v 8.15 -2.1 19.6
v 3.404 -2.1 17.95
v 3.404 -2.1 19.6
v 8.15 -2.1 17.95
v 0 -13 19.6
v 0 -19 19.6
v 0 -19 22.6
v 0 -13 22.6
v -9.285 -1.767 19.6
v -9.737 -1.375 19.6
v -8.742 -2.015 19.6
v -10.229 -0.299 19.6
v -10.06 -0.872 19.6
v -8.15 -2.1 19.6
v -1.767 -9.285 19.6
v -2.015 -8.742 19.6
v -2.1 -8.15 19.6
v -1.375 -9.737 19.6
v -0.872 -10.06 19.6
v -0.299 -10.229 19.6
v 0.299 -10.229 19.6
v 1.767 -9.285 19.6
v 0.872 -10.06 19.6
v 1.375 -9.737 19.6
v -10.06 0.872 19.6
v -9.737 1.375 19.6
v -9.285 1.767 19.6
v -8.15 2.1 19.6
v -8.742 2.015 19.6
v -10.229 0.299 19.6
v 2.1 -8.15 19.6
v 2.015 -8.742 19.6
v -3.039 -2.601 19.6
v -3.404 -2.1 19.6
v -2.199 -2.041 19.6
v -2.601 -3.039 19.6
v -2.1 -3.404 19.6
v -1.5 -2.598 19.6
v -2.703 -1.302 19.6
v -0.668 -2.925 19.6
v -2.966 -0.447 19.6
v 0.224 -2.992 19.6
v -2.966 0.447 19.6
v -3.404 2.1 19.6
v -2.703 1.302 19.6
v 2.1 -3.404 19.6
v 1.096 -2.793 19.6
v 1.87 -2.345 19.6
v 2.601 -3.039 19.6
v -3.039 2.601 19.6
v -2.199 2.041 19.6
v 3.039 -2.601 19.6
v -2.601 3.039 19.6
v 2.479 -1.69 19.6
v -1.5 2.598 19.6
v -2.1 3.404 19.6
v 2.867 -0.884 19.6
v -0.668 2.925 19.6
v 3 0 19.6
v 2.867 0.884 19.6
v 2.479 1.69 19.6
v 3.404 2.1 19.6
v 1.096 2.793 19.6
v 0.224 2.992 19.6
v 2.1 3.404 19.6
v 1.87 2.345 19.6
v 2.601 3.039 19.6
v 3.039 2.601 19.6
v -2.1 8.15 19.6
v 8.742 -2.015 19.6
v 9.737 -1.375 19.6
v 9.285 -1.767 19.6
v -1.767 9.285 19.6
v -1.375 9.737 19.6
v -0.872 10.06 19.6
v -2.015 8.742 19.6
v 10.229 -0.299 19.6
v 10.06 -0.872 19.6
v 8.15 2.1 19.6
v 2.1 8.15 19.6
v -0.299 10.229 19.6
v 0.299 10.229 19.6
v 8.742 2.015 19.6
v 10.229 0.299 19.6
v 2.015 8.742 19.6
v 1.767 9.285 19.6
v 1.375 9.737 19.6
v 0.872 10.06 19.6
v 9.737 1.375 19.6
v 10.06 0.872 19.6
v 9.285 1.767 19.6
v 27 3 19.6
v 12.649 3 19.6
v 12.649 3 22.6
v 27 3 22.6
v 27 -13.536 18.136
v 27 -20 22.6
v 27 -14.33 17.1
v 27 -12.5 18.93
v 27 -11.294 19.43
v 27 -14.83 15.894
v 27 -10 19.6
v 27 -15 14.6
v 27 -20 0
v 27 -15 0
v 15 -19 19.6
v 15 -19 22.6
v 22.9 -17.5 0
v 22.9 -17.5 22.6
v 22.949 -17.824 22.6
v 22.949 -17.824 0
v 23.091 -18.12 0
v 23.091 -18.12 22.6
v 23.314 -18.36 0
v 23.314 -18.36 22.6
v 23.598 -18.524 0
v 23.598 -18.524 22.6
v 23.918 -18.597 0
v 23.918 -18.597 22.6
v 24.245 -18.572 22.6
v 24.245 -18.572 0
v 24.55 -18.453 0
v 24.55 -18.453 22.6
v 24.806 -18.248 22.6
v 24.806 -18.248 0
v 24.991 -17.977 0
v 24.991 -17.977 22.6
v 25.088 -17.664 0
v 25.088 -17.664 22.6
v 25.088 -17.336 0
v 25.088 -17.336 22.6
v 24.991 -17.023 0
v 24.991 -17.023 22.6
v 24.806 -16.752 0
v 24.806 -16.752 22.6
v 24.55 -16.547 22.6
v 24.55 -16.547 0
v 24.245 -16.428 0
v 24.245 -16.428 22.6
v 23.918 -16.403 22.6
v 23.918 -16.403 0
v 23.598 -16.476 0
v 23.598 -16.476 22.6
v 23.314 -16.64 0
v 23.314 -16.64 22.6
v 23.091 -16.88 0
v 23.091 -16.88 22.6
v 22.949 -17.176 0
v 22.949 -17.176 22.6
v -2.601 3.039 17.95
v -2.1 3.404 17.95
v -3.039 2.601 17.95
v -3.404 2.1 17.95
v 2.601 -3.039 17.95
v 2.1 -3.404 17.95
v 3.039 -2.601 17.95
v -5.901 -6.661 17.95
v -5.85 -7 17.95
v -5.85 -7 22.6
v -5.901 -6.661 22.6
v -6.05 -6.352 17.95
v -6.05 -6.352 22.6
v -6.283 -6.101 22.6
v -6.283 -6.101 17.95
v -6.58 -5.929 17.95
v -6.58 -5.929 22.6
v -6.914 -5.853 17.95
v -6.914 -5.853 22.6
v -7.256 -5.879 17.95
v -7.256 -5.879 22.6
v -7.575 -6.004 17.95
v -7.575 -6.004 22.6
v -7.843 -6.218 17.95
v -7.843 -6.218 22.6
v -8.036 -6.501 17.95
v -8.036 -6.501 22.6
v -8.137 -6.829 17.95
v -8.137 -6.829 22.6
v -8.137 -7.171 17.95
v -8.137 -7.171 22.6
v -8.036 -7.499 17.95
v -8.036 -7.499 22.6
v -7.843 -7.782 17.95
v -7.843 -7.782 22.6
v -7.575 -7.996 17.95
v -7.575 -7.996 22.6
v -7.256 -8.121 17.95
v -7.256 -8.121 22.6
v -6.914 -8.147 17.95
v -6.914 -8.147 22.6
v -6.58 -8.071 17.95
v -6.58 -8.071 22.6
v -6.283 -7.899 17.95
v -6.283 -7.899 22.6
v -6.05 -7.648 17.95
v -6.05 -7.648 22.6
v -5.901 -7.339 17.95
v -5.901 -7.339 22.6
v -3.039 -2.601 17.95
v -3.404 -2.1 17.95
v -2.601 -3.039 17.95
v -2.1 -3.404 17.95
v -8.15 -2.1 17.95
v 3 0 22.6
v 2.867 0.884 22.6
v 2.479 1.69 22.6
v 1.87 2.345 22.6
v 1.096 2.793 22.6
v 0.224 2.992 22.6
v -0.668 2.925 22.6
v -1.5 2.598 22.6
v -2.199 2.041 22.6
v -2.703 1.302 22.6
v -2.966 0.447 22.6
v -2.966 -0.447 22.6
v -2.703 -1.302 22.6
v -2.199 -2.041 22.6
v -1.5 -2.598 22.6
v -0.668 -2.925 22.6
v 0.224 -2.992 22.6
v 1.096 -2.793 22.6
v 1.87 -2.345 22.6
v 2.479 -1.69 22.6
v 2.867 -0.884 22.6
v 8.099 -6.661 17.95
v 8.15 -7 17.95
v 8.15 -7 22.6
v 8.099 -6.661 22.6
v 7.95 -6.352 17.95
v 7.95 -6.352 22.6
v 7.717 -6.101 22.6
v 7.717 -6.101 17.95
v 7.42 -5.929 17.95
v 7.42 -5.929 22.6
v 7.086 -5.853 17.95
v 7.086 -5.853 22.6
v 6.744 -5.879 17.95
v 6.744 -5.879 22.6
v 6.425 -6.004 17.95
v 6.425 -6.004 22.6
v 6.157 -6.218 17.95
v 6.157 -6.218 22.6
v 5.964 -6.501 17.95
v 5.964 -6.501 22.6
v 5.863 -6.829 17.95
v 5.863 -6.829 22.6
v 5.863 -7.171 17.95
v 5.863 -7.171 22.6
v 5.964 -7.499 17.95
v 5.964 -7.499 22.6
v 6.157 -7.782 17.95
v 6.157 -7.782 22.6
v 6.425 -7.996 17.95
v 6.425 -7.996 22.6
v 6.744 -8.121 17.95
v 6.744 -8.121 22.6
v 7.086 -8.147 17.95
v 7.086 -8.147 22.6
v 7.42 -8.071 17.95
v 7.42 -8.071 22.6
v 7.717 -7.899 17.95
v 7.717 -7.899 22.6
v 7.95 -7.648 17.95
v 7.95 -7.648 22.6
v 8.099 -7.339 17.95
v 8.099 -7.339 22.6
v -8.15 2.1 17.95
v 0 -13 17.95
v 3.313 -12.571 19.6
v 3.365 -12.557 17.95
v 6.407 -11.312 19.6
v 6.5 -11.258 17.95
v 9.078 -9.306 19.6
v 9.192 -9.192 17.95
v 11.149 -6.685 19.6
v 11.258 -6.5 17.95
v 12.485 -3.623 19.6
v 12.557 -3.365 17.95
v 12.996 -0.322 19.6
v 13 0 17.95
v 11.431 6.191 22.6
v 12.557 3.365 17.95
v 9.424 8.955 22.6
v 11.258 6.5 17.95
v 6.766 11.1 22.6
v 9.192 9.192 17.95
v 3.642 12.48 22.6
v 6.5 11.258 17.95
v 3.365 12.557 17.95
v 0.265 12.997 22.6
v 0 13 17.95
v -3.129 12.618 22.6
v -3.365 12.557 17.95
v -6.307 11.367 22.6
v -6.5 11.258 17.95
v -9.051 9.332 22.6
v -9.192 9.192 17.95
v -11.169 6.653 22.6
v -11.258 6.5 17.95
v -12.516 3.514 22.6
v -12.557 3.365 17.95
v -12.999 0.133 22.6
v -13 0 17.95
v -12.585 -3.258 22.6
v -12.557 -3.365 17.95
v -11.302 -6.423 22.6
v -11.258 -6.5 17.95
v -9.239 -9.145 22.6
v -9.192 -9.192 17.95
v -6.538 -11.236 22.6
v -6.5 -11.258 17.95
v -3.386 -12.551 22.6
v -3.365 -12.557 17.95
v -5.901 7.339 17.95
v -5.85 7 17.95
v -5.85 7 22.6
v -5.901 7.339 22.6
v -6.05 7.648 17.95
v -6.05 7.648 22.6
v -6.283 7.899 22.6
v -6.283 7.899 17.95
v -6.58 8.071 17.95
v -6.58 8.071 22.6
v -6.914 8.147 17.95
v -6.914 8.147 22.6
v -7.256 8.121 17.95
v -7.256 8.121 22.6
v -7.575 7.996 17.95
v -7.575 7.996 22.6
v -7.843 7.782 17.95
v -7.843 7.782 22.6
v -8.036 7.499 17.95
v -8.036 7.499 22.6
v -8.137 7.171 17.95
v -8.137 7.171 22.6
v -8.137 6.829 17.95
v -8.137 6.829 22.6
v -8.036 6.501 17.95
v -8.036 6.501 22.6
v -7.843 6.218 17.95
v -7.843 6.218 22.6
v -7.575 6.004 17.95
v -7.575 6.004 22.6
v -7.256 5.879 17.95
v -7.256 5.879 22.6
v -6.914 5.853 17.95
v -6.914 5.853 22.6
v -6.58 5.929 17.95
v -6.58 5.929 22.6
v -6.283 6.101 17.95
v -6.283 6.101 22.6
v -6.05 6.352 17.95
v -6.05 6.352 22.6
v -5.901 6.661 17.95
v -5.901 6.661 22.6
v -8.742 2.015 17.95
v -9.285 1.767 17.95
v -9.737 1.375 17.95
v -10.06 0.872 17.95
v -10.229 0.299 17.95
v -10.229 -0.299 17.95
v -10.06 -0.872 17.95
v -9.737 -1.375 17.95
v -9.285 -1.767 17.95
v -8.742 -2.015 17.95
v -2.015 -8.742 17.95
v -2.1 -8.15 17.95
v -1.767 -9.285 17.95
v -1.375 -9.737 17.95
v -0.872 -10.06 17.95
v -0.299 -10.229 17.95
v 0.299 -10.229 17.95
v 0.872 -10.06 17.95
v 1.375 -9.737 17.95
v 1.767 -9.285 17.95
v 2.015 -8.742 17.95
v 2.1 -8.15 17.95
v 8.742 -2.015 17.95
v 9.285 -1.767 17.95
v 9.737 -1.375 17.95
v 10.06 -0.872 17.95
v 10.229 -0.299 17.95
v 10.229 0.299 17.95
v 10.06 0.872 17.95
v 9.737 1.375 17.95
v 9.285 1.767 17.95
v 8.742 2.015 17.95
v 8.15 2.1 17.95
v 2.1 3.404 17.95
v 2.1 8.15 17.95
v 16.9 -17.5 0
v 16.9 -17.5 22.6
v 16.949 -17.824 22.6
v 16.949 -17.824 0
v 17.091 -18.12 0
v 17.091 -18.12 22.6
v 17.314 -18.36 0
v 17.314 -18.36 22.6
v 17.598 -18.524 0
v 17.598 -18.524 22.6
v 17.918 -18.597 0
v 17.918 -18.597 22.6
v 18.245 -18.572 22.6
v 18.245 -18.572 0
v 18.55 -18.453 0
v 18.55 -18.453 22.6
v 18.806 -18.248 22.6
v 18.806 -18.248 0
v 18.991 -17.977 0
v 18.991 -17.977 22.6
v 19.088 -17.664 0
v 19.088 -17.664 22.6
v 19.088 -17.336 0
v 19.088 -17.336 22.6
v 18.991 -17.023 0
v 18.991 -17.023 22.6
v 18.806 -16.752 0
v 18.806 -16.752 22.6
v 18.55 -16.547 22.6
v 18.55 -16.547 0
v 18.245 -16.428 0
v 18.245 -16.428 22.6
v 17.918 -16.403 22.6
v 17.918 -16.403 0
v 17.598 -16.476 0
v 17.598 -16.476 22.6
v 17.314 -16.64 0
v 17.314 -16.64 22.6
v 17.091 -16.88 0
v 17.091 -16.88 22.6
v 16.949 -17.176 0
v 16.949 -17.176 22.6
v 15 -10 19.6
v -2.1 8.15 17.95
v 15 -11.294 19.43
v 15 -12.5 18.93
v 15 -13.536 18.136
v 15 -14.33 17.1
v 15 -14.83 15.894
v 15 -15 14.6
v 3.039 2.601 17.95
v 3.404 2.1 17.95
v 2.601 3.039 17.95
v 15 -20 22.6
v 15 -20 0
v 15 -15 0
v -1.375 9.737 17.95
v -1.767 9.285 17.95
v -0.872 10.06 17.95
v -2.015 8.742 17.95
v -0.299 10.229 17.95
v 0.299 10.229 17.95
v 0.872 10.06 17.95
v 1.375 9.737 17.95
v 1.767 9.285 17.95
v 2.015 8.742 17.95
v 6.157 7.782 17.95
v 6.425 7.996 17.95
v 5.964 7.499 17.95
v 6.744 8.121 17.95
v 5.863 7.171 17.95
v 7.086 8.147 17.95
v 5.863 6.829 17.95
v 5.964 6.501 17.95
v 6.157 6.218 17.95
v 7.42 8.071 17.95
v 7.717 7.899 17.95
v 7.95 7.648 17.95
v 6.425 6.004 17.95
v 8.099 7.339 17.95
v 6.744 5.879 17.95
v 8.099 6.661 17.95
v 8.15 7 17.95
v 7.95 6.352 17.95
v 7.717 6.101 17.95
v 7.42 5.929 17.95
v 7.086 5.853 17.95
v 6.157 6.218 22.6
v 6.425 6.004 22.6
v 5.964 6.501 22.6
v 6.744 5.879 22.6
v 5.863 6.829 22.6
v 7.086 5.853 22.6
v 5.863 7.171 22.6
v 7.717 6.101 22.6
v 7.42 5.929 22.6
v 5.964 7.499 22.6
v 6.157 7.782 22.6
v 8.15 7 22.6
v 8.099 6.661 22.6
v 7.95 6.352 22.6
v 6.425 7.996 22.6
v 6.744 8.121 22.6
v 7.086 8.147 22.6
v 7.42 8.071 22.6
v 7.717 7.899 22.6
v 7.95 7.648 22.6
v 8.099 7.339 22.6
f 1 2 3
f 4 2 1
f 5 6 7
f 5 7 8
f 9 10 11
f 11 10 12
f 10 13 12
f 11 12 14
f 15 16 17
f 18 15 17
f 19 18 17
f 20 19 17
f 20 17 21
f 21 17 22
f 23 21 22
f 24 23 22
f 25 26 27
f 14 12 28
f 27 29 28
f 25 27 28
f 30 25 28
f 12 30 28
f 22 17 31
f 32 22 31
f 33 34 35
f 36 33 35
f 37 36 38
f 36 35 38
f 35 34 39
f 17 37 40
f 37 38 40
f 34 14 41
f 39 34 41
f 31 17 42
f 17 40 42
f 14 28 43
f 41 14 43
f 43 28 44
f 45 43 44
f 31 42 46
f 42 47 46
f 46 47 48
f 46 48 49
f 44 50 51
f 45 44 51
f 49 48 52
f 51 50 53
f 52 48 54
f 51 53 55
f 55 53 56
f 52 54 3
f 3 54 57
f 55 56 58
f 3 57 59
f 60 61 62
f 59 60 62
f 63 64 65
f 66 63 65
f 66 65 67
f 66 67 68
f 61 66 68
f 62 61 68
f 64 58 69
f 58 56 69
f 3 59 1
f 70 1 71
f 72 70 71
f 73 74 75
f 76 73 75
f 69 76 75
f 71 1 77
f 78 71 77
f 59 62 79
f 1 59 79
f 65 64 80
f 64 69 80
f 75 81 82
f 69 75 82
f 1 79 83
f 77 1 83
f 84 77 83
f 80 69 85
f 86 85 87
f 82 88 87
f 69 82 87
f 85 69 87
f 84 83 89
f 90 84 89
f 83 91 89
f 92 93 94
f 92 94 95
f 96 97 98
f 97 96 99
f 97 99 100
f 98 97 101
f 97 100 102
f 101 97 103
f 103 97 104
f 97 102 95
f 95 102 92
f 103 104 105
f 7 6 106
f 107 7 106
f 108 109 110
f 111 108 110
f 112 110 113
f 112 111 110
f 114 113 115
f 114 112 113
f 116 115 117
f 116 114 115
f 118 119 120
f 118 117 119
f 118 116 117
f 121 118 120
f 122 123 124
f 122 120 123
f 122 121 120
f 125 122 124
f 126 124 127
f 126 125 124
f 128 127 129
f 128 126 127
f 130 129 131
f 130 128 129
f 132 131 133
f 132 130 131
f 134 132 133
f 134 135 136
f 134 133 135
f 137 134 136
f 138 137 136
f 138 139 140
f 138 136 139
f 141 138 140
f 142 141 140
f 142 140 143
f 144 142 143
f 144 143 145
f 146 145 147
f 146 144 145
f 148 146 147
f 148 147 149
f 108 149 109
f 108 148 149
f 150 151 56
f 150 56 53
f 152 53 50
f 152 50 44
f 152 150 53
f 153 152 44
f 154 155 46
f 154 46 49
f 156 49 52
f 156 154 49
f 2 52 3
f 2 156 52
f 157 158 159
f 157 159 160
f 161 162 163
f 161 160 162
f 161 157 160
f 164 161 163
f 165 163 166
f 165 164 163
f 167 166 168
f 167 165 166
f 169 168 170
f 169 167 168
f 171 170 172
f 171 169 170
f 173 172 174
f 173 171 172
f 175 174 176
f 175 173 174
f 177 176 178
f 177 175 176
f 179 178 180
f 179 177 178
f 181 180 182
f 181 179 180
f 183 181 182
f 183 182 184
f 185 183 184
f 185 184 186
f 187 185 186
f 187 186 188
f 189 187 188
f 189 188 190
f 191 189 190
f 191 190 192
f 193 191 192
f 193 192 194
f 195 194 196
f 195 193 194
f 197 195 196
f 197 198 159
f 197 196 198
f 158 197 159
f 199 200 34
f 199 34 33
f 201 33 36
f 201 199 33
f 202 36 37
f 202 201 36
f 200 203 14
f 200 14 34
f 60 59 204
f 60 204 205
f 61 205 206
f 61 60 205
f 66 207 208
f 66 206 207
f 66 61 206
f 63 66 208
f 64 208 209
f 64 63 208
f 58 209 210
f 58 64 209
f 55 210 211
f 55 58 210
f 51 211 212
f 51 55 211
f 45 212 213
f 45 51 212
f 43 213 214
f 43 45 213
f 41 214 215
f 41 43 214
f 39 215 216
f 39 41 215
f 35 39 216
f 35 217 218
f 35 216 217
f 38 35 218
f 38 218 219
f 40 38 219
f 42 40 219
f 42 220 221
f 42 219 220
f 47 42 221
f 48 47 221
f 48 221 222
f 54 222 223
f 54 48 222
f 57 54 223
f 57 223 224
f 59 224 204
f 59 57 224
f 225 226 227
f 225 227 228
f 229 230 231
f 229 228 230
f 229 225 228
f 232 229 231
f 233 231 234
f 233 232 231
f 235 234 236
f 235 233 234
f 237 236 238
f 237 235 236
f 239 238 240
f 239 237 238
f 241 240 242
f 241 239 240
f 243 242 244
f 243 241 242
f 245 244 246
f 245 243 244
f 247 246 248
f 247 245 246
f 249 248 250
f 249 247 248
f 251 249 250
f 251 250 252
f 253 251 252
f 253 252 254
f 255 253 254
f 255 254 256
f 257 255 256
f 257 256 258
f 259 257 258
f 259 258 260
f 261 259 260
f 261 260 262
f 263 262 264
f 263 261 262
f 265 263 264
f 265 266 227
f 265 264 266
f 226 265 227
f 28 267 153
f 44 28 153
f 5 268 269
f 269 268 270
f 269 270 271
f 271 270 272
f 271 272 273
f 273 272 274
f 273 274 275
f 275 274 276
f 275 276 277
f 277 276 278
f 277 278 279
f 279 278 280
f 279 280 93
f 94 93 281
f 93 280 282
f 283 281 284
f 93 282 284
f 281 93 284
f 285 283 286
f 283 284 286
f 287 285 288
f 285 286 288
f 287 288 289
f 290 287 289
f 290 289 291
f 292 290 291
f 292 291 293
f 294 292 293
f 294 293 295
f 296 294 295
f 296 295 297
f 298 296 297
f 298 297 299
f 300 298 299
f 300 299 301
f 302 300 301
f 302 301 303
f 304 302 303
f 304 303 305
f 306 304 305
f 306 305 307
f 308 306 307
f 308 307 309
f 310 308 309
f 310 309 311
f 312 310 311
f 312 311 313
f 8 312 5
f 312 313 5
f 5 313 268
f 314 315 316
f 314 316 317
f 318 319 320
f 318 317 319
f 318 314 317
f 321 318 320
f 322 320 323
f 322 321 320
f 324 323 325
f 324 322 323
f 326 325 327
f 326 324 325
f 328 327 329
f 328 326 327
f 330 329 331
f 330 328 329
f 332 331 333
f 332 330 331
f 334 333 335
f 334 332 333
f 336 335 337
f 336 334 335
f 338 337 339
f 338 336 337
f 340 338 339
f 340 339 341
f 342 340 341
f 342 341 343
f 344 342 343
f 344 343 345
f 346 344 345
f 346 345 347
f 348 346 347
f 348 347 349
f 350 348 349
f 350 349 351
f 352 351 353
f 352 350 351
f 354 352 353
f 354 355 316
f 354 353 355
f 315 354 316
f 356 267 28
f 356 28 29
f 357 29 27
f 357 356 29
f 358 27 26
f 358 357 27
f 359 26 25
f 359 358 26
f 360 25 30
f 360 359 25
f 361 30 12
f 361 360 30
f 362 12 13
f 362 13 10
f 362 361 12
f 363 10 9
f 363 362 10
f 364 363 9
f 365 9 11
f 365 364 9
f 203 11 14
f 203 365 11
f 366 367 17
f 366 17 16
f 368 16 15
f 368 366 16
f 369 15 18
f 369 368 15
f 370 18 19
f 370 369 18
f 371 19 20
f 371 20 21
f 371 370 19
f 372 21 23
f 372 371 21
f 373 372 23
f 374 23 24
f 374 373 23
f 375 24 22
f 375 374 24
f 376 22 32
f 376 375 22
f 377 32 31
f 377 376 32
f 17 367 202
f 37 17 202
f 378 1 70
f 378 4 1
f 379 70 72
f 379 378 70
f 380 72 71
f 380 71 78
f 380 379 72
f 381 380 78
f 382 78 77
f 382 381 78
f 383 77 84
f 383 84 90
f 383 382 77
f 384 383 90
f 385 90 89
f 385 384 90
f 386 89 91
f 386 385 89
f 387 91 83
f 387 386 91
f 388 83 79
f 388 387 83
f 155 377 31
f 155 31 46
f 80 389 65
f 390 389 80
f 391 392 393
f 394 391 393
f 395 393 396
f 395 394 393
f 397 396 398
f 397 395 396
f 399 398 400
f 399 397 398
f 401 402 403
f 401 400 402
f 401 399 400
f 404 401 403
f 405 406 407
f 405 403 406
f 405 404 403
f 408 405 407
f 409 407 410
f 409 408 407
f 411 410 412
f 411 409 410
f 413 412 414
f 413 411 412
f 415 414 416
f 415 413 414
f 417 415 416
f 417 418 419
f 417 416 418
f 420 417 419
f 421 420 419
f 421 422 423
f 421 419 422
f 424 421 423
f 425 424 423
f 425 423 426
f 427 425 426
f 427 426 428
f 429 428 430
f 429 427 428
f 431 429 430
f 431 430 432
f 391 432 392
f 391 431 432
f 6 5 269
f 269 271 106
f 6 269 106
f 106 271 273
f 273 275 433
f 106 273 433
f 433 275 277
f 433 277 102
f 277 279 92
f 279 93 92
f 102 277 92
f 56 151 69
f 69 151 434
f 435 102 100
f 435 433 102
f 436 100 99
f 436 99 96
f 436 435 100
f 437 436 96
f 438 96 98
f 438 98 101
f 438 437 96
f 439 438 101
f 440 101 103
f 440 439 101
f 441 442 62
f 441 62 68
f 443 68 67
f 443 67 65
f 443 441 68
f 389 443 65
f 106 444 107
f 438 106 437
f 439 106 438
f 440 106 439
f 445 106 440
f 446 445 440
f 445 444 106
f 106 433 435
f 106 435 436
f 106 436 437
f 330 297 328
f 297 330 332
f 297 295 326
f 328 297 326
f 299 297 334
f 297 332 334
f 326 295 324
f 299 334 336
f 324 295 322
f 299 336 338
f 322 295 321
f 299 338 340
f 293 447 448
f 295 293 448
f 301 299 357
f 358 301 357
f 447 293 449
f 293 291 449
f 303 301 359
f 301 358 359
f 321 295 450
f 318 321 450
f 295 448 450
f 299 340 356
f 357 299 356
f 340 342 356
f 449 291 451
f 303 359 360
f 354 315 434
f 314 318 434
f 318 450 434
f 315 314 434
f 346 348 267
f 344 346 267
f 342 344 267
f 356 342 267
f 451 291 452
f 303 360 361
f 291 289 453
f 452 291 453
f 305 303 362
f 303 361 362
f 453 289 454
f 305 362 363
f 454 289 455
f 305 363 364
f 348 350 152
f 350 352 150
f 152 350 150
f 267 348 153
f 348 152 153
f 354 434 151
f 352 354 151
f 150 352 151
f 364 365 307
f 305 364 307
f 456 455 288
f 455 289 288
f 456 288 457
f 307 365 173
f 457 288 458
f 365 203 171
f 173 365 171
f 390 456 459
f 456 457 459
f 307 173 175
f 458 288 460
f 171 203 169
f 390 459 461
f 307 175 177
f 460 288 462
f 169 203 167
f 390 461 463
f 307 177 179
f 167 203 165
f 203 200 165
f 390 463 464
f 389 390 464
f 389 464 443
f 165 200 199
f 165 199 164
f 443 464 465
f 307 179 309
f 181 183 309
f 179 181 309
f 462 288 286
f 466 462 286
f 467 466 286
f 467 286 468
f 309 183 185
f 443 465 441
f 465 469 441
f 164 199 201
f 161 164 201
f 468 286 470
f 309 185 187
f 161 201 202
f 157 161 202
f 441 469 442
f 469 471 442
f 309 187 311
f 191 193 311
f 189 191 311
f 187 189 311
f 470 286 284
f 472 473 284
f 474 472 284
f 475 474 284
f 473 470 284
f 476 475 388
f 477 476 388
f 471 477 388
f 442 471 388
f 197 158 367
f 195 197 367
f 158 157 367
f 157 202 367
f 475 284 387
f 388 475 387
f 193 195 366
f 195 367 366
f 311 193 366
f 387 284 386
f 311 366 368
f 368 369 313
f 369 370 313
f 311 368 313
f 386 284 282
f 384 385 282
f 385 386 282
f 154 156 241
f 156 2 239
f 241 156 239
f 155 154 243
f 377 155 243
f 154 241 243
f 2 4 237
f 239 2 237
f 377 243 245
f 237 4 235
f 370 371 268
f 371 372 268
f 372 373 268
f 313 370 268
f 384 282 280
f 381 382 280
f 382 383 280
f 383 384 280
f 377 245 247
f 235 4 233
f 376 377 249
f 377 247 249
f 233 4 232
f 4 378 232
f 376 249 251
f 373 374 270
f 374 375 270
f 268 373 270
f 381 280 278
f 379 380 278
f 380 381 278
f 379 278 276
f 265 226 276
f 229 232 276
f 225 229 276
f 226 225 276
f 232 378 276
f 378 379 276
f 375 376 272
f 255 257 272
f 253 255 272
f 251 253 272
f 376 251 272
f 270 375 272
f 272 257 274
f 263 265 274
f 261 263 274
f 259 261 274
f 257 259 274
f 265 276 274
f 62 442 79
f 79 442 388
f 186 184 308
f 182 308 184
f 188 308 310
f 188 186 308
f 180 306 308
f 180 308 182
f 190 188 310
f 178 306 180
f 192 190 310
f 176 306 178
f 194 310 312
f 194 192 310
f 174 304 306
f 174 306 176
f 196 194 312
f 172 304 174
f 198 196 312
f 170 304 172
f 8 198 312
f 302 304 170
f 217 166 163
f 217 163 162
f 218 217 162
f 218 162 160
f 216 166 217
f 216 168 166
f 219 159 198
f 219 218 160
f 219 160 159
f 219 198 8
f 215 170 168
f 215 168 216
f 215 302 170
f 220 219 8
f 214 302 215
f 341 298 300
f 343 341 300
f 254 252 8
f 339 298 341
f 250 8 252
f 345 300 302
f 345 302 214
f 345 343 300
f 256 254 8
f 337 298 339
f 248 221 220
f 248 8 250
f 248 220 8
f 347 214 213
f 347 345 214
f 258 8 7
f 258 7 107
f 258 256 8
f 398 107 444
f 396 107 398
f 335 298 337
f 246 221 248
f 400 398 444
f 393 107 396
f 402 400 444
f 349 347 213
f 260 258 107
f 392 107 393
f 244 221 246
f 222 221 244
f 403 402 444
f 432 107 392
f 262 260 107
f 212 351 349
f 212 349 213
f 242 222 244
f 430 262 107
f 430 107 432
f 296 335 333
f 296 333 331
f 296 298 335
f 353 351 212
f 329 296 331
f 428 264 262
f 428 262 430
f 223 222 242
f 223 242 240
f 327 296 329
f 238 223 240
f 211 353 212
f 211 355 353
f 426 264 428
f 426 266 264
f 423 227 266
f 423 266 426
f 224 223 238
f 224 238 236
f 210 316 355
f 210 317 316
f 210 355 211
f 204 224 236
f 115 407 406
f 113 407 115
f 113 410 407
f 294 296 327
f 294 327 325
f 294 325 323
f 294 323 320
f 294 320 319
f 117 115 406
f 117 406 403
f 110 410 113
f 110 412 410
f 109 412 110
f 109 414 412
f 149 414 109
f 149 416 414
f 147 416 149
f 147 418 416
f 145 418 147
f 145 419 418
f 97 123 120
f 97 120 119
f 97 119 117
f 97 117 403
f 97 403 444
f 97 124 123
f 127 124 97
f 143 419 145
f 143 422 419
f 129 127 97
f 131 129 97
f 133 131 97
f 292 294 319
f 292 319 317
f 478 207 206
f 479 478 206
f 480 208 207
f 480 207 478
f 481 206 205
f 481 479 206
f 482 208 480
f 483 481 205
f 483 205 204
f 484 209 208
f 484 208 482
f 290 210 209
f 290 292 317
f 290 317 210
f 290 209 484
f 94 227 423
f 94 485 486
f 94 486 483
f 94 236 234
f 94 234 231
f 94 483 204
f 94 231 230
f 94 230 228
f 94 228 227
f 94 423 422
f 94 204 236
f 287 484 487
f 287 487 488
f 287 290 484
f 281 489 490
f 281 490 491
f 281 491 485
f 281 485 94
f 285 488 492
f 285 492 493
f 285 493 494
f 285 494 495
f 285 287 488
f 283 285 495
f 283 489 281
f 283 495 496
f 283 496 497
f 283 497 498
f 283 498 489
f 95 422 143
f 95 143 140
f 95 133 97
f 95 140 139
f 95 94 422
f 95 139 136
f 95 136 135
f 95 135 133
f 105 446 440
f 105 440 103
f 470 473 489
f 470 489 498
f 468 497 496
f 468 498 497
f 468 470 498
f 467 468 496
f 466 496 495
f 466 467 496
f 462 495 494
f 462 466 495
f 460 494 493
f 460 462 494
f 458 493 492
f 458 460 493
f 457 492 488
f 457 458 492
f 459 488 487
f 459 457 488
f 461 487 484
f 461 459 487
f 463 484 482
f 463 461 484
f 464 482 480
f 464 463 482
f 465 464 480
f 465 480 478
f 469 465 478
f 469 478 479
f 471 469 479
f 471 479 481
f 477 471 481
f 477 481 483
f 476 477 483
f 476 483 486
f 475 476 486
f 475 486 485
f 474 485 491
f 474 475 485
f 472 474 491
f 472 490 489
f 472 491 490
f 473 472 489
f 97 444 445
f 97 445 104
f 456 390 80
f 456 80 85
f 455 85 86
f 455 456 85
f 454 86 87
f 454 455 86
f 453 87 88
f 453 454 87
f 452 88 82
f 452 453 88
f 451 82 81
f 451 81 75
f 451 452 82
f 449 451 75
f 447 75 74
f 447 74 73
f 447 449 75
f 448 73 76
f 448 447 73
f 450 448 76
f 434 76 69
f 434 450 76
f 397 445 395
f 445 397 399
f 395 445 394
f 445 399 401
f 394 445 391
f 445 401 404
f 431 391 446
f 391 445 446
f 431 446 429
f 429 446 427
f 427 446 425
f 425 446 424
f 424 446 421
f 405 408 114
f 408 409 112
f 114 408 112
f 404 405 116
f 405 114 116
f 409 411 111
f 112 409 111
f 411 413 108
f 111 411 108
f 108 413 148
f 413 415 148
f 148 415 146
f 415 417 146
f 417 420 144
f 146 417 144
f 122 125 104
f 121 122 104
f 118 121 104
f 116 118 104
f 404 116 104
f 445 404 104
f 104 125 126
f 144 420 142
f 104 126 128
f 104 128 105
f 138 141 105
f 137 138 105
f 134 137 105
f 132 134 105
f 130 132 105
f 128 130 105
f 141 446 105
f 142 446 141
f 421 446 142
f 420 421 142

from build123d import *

# Parameters (mm, degrees)
STOCK_HORN_ATTACHMENT_START          = 19.6
STOCK_HORN_ATTACHMENT_PROFILE_R      = 13
STOCK_HORN_ATTACHMENT_DEPTH          = 3
FINGER_ARM_START                     = 19.6
FINGER_ARM_PROFILE_W                 = 27
FINGER_ARM_PROFILE_H                 = 22
FINGER_ARM_DEPTH                     = 3
DESCENDING_CONTACT_FINGER_PROFILE_W  = 12
DESCENDING_CONTACT_FINGER_PROFILE_H  = 5
DESCENDING_CONTACT_FINGER_DEPTH      = 22.6
HORN_CENTER_ACCESS_START             = -50
HORN_CENTER_ACCESS_PROFILE_R         = 3
HORN_CENTER_ACCESS_DEPTH             = 91.493950165
CAPTURED_HORN_KEY_BOSS_START         = 17.95
CAPTURED_HORN_KEY_BOSS_PROFILE_R     = 13
CAPTURED_HORN_KEY_BOSS_DEPTH         = 1.65
KEY_POCKET_HUB_START                 = 17.95
STOCK_HORN_POCKET_HUB_R              = 3.55
KEY_POCKET_HUB_DEPTH                 = 1.65
KEY_POCKET_HORIZONTAL_START          = 17.95
STOCK_HORN_POCKET_HORIZONTAL_W       = 16.3
STOCK_HORN_POCKET_HORIZONTAL_H       = 4.2
KEY_POCKET_HORIZONTAL_DEPTH          = 1.65
KEY_POCKET_VERTICAL_START            = 17.95
STOCK_HORN_POCKET_VERTICAL_W         = 4.2
STOCK_HORN_POCKET_VERTICAL_H         = 16.3
KEY_POCKET_VERTICAL_DEPTH            = 1.65
KEY_POCKET_ROUNDED_TIPS_START        = 17.95
STOCK_HORN_POCKET_ROUNDED_TIPS_R     = 2.1
KEY_POCKET_ROUNDED_TIPS_DEPTH        = 1.65
UNMODIFIED_HORN_CAPTURE_M2_START     = -50
UNMODIFIED_HORN_CAPTURE_M2_PROFILE_R = 1.15
UNMODIFIED_HORN_CAPTURE_M2_DEPTH     = 91.493950165
HUB_CLEARANCE_IN_KEY_BOSS_ONLY_START = 17.95
HORN_CENTER_HUB_CLEARANCE_R          = 4
HUB_CLEARANCE_IN_KEY_BOSS_ONLY_DEPTH = 1.65
CONTACT_PAD_KEEPER_START             = -50
CONTACT_PAD_KEEPER_PROFILE_R         = 1.1
CONTACT_PAD_KEEPER_DEPTH             = 91.493950165
FILLET1_R                            = 5


with BuildPart() as part:
    # Stock_horn_attachment_profile → Stock_horn_attachment (new body)
    with BuildSketch(Plane.XY.offset(STOCK_HORN_ATTACHMENT_START)):
        Circle(STOCK_HORN_ATTACHMENT_PROFILE_R)
    extrude(amount=STOCK_HORN_ATTACHMENT_DEPTH)

    # Finger_arm_profile → Finger_arm (add)
    with BuildSketch(Plane.XY.offset(FINGER_ARM_START)):
        with Locations((13.5, -8)):
            Rectangle(FINGER_ARM_PROFILE_W, FINGER_ARM_PROFILE_H)
    extrude(amount=FINGER_ARM_DEPTH)

    # Descending_contact_finger_profile → Descending_contact_finger (add)
    with BuildSketch(Plane.XY):
        with Locations((21, -17.5)):
            Rectangle(DESCENDING_CONTACT_FINGER_PROFILE_W, DESCENDING_CONTACT_FINGER_PROFILE_H)
    extrude(amount=DESCENDING_CONTACT_FINGER_DEPTH)

    # Horn_center_access_profile → Horn_center_access (cut, through all)
    with BuildSketch(Plane.XY.offset(HORN_CENTER_ACCESS_START)):
        Circle(HORN_CENTER_ACCESS_PROFILE_R)
    extrude(amount=HORN_CENTER_ACCESS_DEPTH, mode=Mode.SUBTRACT)

    # Captured_horn_key_boss_profile → Captured_horn_key_boss (add)
    with BuildSketch(Plane.XY.offset(CAPTURED_HORN_KEY_BOSS_START)):
        with Locations(Location((0, 0, 0), (0, 0, 270))):
            Circle(CAPTURED_HORN_KEY_BOSS_PROFILE_R)
    extrude(amount=CAPTURED_HORN_KEY_BOSS_DEPTH)

    # Stock_horn_pocket_Hub → Key_pocket_Hub (cut)
    with BuildSketch(Plane.XY.offset(KEY_POCKET_HUB_START)):
        Circle(STOCK_HORN_POCKET_HUB_R)
    extrude(amount=KEY_POCKET_HUB_DEPTH, mode=Mode.SUBTRACT)

    # Stock_horn_pocket_Horizontal → Key_pocket_Horizontal (cut)
    with BuildSketch(Plane.XY.offset(KEY_POCKET_HORIZONTAL_START)):
        Rectangle(STOCK_HORN_POCKET_HORIZONTAL_W, STOCK_HORN_POCKET_HORIZONTAL_H)
    extrude(amount=KEY_POCKET_HORIZONTAL_DEPTH, mode=Mode.SUBTRACT)

    # Stock_horn_pocket_Vertical → Key_pocket_Vertical (cut)
    with BuildSketch(Plane.XY.offset(KEY_POCKET_VERTICAL_START)):
        Rectangle(STOCK_HORN_POCKET_VERTICAL_W, STOCK_HORN_POCKET_VERTICAL_H)
    extrude(amount=KEY_POCKET_VERTICAL_DEPTH, mode=Mode.SUBTRACT)

    # Stock_horn_pocket_Rounded_tips → Key_pocket_Rounded_tips (cut)
    with BuildSketch(Plane.XY.offset(KEY_POCKET_ROUNDED_TIPS_START)):
        with Locations((8.15, 0)):
            Circle(STOCK_HORN_POCKET_ROUNDED_TIPS_R)
        with Locations((-8.15, 0)):
            Circle(STOCK_HORN_POCKET_ROUNDED_TIPS_R)
        with Locations((0, 8.15)):
            Circle(STOCK_HORN_POCKET_ROUNDED_TIPS_R)
        with Locations((0, -8.15)):
            Circle(STOCK_HORN_POCKET_ROUNDED_TIPS_R)
    extrude(amount=KEY_POCKET_ROUNDED_TIPS_DEPTH, mode=Mode.SUBTRACT)

    # Unmodified_horn_capture_M2_profile → Unmodified_horn_capture_M2 (cut, through all)
    with BuildSketch(Plane.XY.offset(UNMODIFIED_HORN_CAPTURE_M2_START)):
        with Locations((7, 7)):
            Circle(UNMODIFIED_HORN_CAPTURE_M2_PROFILE_R)
        with Locations((-7, 7)):
            Circle(UNMODIFIED_HORN_CAPTURE_M2_PROFILE_R)
        with Locations((-7, -7)):
            Circle(UNMODIFIED_HORN_CAPTURE_M2_PROFILE_R)
        with Locations((7, -7)):
            Circle(UNMODIFIED_HORN_CAPTURE_M2_PROFILE_R)
    extrude(amount=UNMODIFIED_HORN_CAPTURE_M2_DEPTH, mode=Mode.SUBTRACT)

    # Horn_center_hub_clearance → Hub_clearance_in_key_boss_only (cut)
    with BuildSketch(Plane.XY.offset(HUB_CLEARANCE_IN_KEY_BOSS_ONLY_START)):
        Circle(HORN_CENTER_HUB_CLEARANCE_R)
    extrude(amount=HUB_CLEARANCE_IN_KEY_BOSS_ONLY_DEPTH, mode=Mode.SUBTRACT)

    # Contact_pad_keeper_profile → Contact_pad_keeper (cut, through all)
    with BuildSketch(Plane.XY.offset(CONTACT_PAD_KEEPER_START)):
        with Locations(Location((18, -17.5, 0), (0, 0, 180))):
            Circle(CONTACT_PAD_KEEPER_PROFILE_R)
        with Locations(Location((24, -17.5, 0), (0, 0, 180))):
            Circle(CONTACT_PAD_KEEPER_PROFILE_R)
    extrude(amount=CONTACT_PAD_KEEPER_DEPTH, mode=Mode.SUBTRACT)

    # Fillet1
    fillet1_edges = [part.edges().sort_by_distance(p)[0] for p in [
        (21, -15, 19.6),
    ]]
    fillet(fillet1_edges, radius=FILLET1_R)


solid = part.part
